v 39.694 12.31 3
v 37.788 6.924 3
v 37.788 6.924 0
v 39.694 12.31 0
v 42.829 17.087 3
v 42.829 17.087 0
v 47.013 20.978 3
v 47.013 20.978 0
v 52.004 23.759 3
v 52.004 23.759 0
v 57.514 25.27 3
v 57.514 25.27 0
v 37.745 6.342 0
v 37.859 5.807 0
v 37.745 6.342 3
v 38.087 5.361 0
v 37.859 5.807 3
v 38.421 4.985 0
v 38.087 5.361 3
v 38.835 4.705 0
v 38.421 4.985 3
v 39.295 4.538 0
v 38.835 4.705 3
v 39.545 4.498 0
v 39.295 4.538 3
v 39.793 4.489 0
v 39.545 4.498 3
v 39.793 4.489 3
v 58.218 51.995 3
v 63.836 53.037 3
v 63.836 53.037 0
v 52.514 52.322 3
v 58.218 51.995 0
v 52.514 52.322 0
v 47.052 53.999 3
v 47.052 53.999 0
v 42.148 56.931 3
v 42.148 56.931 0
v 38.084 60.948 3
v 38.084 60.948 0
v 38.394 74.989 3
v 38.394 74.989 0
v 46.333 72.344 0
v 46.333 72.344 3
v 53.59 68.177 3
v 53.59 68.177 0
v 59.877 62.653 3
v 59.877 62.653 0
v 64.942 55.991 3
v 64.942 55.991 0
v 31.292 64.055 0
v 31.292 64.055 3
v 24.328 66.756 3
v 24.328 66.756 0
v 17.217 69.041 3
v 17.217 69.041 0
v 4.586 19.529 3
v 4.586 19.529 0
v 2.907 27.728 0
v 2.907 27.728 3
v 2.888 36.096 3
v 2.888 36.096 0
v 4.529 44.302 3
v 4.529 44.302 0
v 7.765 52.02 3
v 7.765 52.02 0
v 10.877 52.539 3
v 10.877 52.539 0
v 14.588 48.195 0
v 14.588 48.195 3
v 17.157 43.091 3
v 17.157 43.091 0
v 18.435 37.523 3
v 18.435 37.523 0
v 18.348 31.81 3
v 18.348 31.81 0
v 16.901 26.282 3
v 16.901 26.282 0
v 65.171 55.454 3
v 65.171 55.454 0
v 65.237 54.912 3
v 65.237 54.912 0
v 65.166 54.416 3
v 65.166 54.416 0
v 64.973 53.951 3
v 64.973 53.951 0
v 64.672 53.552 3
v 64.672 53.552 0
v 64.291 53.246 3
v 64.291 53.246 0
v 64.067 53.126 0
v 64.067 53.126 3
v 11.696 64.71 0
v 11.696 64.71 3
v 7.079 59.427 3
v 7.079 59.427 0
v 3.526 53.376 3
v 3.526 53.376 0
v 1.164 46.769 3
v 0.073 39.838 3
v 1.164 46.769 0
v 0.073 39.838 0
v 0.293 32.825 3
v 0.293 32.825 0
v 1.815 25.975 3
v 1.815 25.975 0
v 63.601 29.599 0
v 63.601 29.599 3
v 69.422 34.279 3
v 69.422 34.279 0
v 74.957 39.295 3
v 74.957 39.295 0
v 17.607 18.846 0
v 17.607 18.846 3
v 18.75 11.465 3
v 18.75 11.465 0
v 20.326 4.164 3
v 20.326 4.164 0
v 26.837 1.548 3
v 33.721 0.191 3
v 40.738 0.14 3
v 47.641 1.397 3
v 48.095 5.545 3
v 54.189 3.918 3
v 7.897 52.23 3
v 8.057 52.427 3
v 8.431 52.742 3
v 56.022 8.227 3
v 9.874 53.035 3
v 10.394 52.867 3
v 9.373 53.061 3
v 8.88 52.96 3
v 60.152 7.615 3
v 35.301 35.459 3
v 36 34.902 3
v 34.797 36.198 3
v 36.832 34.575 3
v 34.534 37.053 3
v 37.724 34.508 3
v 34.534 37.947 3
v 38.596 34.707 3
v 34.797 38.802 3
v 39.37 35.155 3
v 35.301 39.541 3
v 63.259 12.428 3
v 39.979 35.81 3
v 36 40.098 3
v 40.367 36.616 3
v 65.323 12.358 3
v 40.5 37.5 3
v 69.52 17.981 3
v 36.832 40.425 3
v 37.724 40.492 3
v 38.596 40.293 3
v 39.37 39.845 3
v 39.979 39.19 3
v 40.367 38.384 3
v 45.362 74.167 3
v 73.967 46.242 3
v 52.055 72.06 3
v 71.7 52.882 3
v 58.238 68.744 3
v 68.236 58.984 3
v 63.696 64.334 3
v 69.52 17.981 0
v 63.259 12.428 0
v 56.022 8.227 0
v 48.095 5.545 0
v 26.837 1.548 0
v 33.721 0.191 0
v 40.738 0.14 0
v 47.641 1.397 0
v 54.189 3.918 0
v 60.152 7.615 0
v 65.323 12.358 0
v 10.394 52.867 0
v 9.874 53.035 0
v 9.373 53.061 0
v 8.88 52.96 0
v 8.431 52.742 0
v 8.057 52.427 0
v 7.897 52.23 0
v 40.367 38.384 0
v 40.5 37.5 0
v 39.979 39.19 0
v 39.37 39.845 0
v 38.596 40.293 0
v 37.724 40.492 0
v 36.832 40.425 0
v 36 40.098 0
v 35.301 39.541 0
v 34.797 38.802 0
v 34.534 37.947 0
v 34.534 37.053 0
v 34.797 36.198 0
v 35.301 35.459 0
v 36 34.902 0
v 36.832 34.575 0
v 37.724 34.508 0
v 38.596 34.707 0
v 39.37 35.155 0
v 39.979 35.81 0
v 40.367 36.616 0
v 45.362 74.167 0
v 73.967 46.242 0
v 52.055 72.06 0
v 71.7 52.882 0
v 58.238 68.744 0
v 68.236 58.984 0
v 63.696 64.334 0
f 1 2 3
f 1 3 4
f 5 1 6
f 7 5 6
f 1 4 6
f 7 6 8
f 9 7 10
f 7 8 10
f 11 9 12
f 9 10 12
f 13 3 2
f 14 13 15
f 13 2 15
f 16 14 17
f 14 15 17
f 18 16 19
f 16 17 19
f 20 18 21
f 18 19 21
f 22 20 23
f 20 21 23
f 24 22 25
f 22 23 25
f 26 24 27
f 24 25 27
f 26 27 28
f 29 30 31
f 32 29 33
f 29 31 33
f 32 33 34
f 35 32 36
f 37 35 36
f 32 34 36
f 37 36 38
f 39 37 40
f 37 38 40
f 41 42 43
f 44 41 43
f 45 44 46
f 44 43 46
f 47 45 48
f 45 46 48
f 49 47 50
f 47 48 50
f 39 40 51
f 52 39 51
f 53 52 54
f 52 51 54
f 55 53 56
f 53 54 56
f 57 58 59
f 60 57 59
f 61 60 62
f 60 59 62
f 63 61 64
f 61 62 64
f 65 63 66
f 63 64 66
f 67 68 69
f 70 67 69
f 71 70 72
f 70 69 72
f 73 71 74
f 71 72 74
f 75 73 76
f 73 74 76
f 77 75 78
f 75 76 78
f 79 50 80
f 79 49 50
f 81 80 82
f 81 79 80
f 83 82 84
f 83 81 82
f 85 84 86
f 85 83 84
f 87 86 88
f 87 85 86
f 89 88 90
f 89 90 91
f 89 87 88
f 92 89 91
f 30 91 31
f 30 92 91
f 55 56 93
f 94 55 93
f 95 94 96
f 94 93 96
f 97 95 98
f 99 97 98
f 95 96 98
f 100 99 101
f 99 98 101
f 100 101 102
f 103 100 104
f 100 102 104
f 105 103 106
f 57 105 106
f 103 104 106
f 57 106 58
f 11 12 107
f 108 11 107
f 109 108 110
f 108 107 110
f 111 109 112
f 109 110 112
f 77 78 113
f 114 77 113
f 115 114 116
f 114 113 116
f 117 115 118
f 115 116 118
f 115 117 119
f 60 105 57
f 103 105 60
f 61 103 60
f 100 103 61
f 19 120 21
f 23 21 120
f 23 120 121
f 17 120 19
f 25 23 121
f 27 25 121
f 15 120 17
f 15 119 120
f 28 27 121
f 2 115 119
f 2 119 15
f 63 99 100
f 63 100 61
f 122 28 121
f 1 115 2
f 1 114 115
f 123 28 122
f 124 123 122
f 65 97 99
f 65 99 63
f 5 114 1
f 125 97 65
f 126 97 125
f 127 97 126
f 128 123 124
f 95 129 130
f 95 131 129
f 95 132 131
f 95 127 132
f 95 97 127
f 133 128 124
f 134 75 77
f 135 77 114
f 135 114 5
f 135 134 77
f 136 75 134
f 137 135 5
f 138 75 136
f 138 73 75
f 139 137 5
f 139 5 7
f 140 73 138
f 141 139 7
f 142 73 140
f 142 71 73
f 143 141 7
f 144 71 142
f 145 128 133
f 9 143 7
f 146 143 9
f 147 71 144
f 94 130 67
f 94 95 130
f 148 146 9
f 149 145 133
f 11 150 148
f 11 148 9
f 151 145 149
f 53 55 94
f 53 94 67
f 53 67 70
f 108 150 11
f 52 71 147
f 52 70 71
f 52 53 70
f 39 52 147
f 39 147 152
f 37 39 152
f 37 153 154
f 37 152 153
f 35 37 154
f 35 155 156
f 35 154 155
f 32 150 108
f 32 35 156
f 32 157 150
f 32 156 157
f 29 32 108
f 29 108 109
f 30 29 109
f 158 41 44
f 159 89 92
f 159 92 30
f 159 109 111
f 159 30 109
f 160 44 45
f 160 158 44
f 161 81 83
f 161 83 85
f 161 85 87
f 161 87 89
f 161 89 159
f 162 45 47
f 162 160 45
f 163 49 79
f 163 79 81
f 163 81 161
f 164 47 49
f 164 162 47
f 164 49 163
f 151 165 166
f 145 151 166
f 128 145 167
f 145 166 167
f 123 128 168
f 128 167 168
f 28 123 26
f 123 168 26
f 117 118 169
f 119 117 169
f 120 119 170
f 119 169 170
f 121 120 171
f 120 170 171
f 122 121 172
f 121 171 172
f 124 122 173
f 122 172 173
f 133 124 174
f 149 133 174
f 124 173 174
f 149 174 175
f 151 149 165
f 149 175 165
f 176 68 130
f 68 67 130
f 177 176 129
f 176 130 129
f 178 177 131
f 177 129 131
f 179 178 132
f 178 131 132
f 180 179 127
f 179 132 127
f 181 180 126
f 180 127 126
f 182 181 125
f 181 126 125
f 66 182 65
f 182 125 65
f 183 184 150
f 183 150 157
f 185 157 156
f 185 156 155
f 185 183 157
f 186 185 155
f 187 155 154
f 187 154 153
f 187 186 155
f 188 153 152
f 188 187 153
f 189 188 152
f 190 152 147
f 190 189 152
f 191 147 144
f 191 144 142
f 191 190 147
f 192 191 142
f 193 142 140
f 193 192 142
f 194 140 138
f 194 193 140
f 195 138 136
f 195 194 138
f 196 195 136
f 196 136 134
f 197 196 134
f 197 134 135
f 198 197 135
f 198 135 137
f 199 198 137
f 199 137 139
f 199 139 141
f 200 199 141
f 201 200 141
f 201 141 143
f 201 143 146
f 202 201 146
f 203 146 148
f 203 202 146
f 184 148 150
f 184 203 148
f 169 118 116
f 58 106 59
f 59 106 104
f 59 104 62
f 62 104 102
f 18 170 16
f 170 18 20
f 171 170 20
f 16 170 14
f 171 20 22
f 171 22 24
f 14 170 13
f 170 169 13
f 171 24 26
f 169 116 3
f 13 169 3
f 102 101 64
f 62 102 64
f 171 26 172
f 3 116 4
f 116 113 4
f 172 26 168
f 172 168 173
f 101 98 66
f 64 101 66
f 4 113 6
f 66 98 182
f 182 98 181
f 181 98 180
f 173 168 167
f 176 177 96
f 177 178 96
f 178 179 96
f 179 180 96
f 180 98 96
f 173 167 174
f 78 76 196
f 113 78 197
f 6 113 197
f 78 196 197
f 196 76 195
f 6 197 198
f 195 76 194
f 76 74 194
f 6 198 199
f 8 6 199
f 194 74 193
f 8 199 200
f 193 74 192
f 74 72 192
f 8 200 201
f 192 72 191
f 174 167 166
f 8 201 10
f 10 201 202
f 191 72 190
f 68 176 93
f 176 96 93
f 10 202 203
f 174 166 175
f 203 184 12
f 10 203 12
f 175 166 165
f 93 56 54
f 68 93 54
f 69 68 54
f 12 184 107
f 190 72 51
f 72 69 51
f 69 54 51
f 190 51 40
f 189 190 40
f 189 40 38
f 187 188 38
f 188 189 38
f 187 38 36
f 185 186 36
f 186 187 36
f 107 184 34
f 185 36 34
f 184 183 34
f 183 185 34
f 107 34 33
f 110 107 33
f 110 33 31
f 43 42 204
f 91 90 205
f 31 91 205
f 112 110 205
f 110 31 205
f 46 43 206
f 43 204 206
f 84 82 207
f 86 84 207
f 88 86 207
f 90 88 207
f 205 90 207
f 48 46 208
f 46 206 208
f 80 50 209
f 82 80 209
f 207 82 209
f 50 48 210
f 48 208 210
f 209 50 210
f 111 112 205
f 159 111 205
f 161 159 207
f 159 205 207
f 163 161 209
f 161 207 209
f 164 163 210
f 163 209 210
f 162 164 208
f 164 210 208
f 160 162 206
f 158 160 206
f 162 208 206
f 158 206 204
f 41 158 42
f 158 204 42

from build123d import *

# Parameters (mm, degrees)
F0_R     = 3
F1_DEPTH = 3
F2_R     = 2
F3_R     = 2


with BuildPart() as f1:
    # F0 (on Top) → F1 (new body)
    with BuildSketch(Plane.XY):
        with BuildLine():
            ThreePointArc((57.514202, 25.269969), (66.546327, 31.896246), (74.956996, 39.295399))
            ThreePointArc((74.956996, 39.295399), (63.695653, 64.333519), (38.3939, 74.989344))
            ThreePointArc((38.3939, 74.989344), (54.563179, 67.459498), (66.146021, 53.895503))
            ThreePointArc((66.146021, 53.895503), (50.919706, 52.664645), (38.084417, 60.947823))
            ThreePointArc((38.084417, 60.947823), (27.82983, 65.456734), (17.216641, 69.041011))
            ThreePointArc((17.216641, 69.041011), (1.163664, 46.769342), (4.586325, 19.529468))
            ThreePointArc((4.586325, 19.529468), (3.022724, 37.297398), (8.978067, 54.11043))
            ThreePointArc((8.978067, 54.11043), (17.657179, 41.539484), (16.901381, 26.282208))
            ThreePointArc((16.901381, 26.282208), (18.123843, 15.14702), (20.326363, 4.163591))
            ThreePointArc((20.326363, 4.163591), (47.640683, 1.397139), (69.519775, 17.981188))
            ThreePointArc((69.519775, 17.981188), (54.914097, 7.743104), (37.375912, 4.494066))
            ThreePointArc((37.375912, 4.494066), (43.923115, 18.295871), (57.514202, 25.269969))
        make_face()
        with Locations((37.5, 37.5)):
            Circle(F0_R, mode=Mode.SUBTRACT)
    extrude(amount=F1_DEPTH)

    # F2
    f2_edges = [f1.edges().sort_by_distance(p)[0] for p in [
        (37.375912, 4.494066, 1.5),
    ]]
    fillet(f2_edges, radius=F2_R)

    # F3
    f3_edges = [f1.edges().sort_by_distance(p)[0] for p in [
        (66.146021, 53.895503, 1.5),
        (8.978067, 54.11043, 1.5),
    ]]
    fillet(f3_edges, radius=F3_R)


solid = f1.part
